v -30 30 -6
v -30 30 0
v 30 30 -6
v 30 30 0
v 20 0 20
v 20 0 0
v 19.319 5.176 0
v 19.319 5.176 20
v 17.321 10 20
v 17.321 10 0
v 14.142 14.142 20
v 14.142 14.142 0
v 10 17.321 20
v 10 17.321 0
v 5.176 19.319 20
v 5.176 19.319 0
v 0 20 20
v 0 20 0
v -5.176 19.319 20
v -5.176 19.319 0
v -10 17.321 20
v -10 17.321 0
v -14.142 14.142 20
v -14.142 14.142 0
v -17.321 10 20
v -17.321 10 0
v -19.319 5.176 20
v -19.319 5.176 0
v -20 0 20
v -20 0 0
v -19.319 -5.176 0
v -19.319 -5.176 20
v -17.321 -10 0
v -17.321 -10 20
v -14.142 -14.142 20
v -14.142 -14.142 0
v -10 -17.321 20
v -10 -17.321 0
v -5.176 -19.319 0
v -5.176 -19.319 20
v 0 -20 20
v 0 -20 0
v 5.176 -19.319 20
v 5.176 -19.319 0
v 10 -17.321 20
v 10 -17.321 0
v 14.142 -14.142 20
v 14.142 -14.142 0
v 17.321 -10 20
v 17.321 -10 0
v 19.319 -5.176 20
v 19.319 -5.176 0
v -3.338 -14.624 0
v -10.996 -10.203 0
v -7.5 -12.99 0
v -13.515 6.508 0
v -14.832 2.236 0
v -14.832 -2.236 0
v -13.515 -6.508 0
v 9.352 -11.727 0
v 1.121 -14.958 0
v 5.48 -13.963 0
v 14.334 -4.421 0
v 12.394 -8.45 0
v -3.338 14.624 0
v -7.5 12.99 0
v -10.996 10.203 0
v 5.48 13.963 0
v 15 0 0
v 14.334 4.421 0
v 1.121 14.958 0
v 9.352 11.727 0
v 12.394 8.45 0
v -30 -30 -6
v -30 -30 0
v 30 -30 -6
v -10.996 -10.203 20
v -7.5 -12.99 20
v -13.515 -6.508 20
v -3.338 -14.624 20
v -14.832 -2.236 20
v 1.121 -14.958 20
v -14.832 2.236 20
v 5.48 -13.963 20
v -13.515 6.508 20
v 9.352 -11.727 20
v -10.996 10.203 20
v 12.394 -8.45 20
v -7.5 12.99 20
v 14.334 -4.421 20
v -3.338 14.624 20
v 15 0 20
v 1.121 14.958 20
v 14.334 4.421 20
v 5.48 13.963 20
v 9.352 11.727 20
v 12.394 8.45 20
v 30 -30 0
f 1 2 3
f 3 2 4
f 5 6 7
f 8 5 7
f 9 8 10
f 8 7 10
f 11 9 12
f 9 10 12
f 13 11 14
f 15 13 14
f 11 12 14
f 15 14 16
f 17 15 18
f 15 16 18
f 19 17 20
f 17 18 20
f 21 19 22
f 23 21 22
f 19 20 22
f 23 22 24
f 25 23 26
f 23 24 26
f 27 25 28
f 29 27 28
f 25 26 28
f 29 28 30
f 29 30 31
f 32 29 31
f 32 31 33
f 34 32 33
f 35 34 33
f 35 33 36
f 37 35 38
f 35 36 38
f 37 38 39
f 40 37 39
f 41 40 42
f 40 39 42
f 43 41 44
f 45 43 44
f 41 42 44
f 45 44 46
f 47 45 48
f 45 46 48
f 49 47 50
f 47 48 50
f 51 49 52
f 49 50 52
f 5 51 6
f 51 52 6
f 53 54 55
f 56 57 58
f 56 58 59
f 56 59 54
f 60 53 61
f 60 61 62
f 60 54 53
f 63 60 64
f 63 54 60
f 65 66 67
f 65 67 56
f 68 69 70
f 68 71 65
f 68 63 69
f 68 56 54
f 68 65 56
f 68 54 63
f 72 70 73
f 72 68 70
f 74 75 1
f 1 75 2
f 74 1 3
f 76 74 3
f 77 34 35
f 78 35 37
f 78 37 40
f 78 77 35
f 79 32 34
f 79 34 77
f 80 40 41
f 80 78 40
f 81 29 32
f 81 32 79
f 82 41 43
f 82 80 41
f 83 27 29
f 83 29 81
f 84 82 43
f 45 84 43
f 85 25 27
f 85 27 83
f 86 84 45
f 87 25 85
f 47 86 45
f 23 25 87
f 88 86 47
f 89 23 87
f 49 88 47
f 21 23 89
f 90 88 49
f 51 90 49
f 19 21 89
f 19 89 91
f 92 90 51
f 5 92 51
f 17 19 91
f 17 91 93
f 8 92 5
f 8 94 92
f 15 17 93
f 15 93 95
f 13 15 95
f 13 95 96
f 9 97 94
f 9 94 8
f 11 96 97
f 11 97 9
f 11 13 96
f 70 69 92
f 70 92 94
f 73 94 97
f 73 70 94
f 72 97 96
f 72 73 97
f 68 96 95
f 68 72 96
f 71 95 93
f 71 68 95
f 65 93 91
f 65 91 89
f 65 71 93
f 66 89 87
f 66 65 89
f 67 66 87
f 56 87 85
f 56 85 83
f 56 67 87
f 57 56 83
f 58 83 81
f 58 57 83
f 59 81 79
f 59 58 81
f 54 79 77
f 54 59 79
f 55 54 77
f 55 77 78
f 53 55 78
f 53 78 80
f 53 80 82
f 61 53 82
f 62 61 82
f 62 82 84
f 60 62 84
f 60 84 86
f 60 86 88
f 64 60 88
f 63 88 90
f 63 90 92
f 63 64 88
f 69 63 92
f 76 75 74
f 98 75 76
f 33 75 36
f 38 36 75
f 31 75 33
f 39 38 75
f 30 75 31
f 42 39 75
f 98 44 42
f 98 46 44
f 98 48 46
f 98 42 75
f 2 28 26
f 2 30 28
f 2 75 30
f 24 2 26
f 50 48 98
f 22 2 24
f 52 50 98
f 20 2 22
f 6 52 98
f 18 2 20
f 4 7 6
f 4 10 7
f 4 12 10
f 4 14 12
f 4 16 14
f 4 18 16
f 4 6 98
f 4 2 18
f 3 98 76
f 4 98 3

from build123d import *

# Parameters (mm, degrees)
SKETCH_W      = 60
SKETCH_H      = 60
PAD_DEPTH     = 6
SKETCH001_R   = 20
SKETCH001_R_2 = 15
PAD001_DEPTH  = 20


with BuildPart() as part:
    # Sketch → Pad (new body)
    with BuildSketch(Plane.XY):
        Rectangle(SKETCH_W, SKETCH_H)
    extrude(amount=-PAD_DEPTH)

    # Sketch001 → Pad001 (join)
    with BuildSketch(Plane.XY):
        Circle(SKETCH001_R)
        Circle(SKETCH001_R_2, mode=Mode.SUBTRACT)
    extrude(amount=PAD001_DEPTH)


solid = part.part
